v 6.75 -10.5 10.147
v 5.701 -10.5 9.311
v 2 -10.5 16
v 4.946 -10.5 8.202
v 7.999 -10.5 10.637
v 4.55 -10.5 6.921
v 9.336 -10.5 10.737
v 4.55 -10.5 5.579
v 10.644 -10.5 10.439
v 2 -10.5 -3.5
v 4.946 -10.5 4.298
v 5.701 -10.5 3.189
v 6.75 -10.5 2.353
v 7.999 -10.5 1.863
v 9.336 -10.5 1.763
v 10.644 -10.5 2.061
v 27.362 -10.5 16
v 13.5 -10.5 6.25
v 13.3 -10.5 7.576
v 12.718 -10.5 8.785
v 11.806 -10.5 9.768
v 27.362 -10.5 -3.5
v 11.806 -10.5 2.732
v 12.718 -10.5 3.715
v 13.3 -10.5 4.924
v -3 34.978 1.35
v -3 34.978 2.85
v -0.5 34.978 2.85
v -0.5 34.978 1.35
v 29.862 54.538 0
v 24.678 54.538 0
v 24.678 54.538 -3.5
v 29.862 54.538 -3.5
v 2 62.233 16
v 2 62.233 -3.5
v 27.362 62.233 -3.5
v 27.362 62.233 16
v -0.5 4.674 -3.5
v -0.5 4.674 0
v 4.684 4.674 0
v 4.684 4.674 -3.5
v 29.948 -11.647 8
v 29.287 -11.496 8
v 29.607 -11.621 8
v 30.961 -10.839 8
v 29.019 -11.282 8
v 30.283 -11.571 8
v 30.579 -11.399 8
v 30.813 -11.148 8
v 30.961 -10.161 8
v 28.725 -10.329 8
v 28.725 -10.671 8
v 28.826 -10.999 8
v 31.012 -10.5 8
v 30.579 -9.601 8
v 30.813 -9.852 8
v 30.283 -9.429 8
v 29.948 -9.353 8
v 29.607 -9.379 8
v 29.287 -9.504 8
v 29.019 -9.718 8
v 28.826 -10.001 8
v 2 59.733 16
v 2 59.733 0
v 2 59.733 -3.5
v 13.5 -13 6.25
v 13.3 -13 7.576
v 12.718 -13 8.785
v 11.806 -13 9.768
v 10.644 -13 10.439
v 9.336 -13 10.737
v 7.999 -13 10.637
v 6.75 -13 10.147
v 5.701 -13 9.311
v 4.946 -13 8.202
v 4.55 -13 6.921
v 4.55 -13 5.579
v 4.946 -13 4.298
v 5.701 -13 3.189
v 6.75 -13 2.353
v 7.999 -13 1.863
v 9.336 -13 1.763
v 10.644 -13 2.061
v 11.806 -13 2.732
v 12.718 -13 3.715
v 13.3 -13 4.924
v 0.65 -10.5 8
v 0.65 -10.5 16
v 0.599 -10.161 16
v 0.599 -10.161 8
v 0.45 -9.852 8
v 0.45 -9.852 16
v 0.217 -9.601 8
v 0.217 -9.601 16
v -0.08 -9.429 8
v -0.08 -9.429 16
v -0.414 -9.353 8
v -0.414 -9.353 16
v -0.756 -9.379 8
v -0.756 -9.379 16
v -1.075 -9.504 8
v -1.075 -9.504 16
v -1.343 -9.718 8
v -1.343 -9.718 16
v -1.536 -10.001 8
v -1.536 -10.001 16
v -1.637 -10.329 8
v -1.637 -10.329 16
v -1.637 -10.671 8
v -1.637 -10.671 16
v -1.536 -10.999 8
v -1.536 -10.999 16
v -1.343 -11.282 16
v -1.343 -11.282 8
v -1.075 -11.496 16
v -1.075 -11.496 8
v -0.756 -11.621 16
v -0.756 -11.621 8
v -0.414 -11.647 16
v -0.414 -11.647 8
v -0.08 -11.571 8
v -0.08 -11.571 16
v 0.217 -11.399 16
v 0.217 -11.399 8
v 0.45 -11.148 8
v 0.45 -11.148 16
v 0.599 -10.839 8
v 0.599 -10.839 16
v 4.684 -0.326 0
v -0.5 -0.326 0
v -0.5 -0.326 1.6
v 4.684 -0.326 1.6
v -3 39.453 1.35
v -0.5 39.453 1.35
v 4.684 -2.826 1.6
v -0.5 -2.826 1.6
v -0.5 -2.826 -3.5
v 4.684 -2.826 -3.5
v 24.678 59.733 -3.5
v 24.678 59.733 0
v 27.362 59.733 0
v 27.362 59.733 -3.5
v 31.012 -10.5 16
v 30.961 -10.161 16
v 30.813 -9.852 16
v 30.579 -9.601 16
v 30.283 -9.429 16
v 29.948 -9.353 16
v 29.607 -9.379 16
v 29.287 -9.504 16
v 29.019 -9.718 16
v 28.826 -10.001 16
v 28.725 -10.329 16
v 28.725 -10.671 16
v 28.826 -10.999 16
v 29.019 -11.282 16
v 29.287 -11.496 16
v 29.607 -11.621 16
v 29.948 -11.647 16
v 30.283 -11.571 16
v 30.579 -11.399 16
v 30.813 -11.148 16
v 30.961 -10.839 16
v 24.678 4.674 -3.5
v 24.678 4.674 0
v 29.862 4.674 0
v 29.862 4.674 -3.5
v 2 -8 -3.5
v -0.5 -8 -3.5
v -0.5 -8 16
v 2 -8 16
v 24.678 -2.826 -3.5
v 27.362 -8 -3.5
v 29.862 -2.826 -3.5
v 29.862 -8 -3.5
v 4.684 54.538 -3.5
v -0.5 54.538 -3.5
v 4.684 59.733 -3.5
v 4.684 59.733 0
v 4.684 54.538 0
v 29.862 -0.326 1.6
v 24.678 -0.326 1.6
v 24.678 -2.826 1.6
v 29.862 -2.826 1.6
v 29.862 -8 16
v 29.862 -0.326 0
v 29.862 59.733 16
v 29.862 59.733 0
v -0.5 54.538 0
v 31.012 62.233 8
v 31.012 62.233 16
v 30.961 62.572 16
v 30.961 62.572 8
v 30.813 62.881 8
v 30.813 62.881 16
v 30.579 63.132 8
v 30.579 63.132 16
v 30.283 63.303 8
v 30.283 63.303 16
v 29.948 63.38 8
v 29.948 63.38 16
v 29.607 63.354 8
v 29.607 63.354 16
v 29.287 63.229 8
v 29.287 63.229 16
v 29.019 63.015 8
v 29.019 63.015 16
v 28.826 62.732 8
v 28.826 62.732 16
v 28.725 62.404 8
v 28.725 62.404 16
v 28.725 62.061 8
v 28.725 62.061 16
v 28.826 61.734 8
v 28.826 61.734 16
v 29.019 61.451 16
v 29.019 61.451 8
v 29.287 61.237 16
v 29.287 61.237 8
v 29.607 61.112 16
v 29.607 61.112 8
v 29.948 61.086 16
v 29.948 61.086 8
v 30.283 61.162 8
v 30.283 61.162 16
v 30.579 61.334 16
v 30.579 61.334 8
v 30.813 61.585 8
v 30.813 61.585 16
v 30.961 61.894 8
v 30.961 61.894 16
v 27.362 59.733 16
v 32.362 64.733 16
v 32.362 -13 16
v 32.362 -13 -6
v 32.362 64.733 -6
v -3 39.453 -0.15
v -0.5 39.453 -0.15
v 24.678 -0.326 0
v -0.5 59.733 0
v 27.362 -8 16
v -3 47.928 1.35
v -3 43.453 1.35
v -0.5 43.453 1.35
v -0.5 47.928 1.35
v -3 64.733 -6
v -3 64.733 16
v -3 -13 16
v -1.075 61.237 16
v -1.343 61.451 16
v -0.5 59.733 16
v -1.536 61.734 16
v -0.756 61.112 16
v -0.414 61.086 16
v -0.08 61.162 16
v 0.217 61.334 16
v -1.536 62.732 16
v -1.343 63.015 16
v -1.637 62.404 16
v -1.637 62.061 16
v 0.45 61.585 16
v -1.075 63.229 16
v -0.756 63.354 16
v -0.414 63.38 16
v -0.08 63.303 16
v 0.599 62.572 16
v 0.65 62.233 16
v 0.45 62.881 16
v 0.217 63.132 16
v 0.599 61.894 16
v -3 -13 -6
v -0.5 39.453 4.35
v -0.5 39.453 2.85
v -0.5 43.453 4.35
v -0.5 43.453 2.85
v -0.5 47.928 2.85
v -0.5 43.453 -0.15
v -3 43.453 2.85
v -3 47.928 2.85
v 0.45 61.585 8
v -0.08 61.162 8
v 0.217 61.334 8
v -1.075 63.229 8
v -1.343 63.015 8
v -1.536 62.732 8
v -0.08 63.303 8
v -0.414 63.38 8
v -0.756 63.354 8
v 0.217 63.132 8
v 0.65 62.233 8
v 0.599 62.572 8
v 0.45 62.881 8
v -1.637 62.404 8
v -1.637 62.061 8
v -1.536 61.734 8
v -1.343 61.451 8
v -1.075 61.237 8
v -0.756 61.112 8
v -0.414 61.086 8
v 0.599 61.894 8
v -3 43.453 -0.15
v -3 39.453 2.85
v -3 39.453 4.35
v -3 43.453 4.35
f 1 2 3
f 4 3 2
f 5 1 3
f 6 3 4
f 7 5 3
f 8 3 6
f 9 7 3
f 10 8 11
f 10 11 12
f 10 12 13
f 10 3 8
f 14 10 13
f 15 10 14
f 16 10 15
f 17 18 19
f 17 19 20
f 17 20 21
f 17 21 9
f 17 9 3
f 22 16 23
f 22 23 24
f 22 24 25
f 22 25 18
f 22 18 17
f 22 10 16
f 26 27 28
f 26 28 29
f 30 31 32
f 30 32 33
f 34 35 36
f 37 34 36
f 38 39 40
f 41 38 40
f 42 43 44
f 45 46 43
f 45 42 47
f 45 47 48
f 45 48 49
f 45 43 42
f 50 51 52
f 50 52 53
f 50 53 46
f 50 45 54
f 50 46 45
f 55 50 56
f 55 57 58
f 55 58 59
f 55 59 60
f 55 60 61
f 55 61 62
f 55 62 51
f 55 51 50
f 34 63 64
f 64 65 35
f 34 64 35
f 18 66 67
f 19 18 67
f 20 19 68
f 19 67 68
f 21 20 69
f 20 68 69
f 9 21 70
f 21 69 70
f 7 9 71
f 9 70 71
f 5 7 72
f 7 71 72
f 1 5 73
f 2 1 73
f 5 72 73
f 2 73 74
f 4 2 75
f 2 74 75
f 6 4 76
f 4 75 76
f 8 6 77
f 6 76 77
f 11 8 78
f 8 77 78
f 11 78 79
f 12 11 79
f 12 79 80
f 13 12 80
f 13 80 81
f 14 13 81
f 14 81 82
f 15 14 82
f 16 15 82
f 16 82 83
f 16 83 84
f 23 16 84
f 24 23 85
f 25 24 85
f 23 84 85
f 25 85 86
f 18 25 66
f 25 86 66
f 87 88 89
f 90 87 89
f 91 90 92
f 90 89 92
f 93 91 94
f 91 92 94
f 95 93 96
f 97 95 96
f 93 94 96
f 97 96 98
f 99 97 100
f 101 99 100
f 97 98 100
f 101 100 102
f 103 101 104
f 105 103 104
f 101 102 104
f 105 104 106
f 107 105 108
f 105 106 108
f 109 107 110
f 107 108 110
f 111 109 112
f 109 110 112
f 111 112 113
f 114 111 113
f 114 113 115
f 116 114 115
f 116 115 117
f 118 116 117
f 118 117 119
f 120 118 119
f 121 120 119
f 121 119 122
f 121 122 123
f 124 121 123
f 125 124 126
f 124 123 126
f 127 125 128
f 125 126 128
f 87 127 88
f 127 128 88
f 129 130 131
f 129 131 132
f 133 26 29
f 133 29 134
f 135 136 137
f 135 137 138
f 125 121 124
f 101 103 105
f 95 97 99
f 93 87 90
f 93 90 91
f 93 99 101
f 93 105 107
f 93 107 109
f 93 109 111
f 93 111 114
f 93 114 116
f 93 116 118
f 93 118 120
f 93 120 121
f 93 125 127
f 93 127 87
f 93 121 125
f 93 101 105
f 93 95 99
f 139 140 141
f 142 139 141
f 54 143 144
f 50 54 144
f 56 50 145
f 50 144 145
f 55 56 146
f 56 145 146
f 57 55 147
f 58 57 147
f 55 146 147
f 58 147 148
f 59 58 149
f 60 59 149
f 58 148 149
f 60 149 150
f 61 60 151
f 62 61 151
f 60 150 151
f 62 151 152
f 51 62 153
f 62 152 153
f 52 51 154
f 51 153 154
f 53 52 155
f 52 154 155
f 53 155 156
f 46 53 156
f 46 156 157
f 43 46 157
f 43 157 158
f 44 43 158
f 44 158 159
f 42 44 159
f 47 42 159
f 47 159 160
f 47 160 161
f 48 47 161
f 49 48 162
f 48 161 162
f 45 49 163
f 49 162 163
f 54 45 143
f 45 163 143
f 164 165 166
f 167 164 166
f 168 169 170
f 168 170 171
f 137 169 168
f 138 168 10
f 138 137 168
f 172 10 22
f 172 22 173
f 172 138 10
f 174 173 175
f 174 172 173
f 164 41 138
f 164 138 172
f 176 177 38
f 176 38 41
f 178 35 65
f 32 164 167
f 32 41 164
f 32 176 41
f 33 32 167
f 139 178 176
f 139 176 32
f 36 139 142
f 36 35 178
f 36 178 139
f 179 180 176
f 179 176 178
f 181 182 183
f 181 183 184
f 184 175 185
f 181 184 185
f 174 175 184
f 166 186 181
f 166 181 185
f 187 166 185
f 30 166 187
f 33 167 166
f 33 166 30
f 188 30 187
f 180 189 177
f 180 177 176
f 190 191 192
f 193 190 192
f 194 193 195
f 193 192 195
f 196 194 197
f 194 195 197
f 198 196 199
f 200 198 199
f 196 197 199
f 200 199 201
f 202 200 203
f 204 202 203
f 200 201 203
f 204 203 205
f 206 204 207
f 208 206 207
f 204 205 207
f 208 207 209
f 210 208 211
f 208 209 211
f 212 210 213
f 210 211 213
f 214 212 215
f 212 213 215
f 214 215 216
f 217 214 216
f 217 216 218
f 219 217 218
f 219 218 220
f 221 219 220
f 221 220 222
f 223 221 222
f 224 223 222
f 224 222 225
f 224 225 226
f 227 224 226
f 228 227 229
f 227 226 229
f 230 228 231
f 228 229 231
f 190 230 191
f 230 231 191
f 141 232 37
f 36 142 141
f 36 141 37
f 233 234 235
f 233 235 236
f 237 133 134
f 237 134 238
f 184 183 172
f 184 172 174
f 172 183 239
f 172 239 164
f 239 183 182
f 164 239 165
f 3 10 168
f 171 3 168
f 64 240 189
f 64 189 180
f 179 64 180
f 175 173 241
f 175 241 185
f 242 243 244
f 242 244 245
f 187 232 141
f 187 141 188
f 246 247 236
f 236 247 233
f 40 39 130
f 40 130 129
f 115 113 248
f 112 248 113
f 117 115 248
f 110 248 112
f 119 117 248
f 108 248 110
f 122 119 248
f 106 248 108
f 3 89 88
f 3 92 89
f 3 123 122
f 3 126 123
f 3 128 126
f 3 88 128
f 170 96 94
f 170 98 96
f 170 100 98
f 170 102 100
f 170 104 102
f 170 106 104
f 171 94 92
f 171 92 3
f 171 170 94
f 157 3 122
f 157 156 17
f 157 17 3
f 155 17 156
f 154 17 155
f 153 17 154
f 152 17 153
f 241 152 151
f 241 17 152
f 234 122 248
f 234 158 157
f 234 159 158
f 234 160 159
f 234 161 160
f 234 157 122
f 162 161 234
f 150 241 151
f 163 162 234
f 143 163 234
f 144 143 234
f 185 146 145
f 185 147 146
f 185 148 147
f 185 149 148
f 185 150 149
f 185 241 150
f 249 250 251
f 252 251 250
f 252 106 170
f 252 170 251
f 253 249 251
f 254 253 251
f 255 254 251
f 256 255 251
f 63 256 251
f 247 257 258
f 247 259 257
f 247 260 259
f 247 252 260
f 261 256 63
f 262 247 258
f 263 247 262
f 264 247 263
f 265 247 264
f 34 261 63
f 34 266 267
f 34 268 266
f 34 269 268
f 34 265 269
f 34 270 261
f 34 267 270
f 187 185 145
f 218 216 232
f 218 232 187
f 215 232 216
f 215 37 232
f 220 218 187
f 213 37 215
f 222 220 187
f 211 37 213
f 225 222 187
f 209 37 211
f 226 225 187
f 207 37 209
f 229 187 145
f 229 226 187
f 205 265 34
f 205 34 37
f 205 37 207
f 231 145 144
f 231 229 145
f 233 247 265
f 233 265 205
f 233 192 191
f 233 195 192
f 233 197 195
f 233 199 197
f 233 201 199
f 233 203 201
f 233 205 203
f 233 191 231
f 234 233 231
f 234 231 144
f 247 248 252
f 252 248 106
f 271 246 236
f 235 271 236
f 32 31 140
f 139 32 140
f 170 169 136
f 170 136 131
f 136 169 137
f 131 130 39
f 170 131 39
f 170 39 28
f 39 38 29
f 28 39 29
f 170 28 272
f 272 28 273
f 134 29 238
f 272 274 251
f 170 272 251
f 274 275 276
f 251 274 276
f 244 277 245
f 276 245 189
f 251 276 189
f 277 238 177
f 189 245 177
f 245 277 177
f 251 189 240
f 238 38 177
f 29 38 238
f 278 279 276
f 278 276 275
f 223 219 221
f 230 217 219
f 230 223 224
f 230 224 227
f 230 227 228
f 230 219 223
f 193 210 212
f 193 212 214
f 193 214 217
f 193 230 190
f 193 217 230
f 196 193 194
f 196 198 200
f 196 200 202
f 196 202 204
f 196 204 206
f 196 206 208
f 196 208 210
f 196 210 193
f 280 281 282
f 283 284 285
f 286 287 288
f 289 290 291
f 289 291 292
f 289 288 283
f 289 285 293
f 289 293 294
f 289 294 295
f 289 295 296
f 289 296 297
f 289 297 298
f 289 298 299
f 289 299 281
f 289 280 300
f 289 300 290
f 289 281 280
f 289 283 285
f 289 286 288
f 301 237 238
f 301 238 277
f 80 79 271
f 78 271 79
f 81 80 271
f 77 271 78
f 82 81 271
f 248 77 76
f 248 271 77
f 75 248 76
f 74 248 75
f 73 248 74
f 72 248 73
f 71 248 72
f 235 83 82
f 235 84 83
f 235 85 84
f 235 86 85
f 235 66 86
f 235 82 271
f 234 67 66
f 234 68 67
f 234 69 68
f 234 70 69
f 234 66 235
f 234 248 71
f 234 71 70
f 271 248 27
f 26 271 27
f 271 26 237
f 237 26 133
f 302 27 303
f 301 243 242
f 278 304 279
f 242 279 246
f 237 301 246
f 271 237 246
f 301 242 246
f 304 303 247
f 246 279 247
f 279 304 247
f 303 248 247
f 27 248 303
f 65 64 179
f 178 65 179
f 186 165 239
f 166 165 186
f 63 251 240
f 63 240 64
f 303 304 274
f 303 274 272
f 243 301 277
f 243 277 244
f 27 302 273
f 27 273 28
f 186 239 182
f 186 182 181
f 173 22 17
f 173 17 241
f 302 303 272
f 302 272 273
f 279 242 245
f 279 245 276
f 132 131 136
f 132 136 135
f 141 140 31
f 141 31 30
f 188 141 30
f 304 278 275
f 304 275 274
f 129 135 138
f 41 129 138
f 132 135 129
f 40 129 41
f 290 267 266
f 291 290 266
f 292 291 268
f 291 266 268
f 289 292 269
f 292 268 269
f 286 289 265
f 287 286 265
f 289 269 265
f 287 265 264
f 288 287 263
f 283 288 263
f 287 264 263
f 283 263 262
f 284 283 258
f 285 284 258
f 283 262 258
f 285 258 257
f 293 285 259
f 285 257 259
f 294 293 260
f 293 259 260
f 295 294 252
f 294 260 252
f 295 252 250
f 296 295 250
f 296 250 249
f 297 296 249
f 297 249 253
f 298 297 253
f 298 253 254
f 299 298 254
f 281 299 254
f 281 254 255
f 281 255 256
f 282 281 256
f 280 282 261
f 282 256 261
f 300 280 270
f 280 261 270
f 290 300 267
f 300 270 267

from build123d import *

# Parameters (mm, degrees)
SKETCH_W          = 35.3624
SKETCH_H          = 77.7328
PAD_DEPTH         = 16
PAD_DEPTH_BACK    = 6
SKETCH002_W       = 30.3624
SKETCH002_H       = 72.7328
POCKET_DEPTH      = 3.5
POCKET_DEPTH_BACK = 16
SKETCH003_W       = 5
SKETCH003_H       = 5
PAD001_DEPTH      = 16
PAD001_DEPTH_BACK = 3.5
SKETCH004_W       = 5.1844
SKETCH004_H       = 5.1948
SKETCH004_H_2     = 5
PAD002_DEPTH      = 3.5
SKETCH005_W       = 5.1844
SKETCH005_H       = 2.5
PAD003_DEPTH      = 1.6
PAD003_DEPTH_BACK = 3.5
SKETCH006_R       = 1.15
POCKET001_DEPTH   = 8
SKETCH007_R       = 4.5
POCKET002_DEPTH   = 2.5
POCKET003_DEPTH   = 2.5


with BuildPart() as part:
    # Sketch → Pad (new body, two sides)
    with BuildSketch(Plane.XY) as pad_sk:
        with Locations((14.6812, 25.8664)):
            Rectangle(SKETCH_W, SKETCH_H)
    extrude(amount=PAD_DEPTH)
    extrude(pad_sk.sketch, amount=-PAD_DEPTH_BACK)

    # Sketch002 → Pocket (cut, two sides)
    with BuildSketch(Plane.XY) as pocket_sk:
        with Locations((14.6812, 25.8664)):
            Rectangle(SKETCH002_W, SKETCH002_H)
    extrude(amount=-POCKET_DEPTH, mode=Mode.SUBTRACT)
    extrude(pocket_sk.sketch, amount=POCKET_DEPTH_BACK, mode=Mode.SUBTRACT)

    # Sketch003 → Pad001 (join, two sides)
    with BuildSketch(Plane.XY) as pad001_sk:
        with Locations((29.8624, -10.5)):
            Rectangle(SKETCH003_W, SKETCH003_H)
        with Locations((-0.5, -10.5)):
            Rectangle(SKETCH003_W, SKETCH003_H)
        with Locations((-0.5, 62.2328)):
            Rectangle(SKETCH003_W, SKETCH003_H)
        with Locations((29.8624, 62.2328)):
            Rectangle(SKETCH003_W, SKETCH003_H)
    extrude(amount=PAD001_DEPTH)
    extrude(pad001_sk.sketch, amount=-PAD001_DEPTH_BACK)

    # Sketch004 → Pad002 (join)
    with BuildSketch(Plane.XY):
        with Locations((2.0922, 57.1354)):
            Rectangle(SKETCH004_W, SKETCH004_H)
        with Locations((27.2702, 57.1354)):
            Rectangle(SKETCH004_W, SKETCH004_H)
        with Locations((2.0922, 2.174)):
            Rectangle(SKETCH004_W, SKETCH004_H_2)
        with Locations((27.2702, 2.174)):
            Rectangle(SKETCH004_W, SKETCH004_H_2)
    extrude(amount=-PAD002_DEPTH)

    # Sketch005 → Pad003 (join, two sides)
    with BuildSketch(Plane.XY) as pad003_sk:
        with Locations((27.2702, -1.576)):
            Rectangle(SKETCH005_W, SKETCH005_H)
        with Locations((2.0922, -1.576)):
            Rectangle(SKETCH005_W, SKETCH005_H)
    extrude(amount=PAD003_DEPTH)
    extrude(pad003_sk.sketch, amount=-PAD003_DEPTH_BACK)

    # Sketch006 (on DatumPlane) → Pocket001 (cut)
    with BuildSketch(Plane.XY.offset(16)):
        with Locations((29.8624, -10.5)):
            Circle(SKETCH006_R)
        with Locations((-0.5, -10.5)):
            Circle(SKETCH006_R)
        with Locations((29.8624, 62.2328)):
            Circle(SKETCH006_R)
        with Locations((-0.5, 62.2328)):
            Circle(SKETCH006_R)
    extrude(amount=-POCKET001_DEPTH, mode=Mode.SUBTRACT)

    # Sketch007 (on DatumPlane) → Pocket002 (cut)
    with BuildSketch(Plane.XZ.offset(13)):
        with Locations((9, 6.25)):
            Circle(SKETCH007_R)
    extrude(amount=-POCKET002_DEPTH, mode=Mode.SUBTRACT)

    # Sketch008 (on DatumPlane) → Pocket003 (cut)
    with BuildSketch(Plane(origin=(-3, 0, 0), x_dir=(0, -1, 0), z_dir=(-1, 0, 0))):
        Polygon((-47.9278, 2.85), (-43.4528, 2.85), (-43.4528, 4.35), (-39.4528, 4.35), (-39.4528, 2.85), (-34.9778, 2.85), (-34.9778, 1.35), (-39.4528, 1.35), (-39.4528, -0.15), (-43.4528, -0.15), (-43.4528, 1.35), (-47.9278, 1.35), align=None)
    extrude(amount=-POCKET003_DEPTH, mode=Mode.SUBTRACT)


solid = part.part
